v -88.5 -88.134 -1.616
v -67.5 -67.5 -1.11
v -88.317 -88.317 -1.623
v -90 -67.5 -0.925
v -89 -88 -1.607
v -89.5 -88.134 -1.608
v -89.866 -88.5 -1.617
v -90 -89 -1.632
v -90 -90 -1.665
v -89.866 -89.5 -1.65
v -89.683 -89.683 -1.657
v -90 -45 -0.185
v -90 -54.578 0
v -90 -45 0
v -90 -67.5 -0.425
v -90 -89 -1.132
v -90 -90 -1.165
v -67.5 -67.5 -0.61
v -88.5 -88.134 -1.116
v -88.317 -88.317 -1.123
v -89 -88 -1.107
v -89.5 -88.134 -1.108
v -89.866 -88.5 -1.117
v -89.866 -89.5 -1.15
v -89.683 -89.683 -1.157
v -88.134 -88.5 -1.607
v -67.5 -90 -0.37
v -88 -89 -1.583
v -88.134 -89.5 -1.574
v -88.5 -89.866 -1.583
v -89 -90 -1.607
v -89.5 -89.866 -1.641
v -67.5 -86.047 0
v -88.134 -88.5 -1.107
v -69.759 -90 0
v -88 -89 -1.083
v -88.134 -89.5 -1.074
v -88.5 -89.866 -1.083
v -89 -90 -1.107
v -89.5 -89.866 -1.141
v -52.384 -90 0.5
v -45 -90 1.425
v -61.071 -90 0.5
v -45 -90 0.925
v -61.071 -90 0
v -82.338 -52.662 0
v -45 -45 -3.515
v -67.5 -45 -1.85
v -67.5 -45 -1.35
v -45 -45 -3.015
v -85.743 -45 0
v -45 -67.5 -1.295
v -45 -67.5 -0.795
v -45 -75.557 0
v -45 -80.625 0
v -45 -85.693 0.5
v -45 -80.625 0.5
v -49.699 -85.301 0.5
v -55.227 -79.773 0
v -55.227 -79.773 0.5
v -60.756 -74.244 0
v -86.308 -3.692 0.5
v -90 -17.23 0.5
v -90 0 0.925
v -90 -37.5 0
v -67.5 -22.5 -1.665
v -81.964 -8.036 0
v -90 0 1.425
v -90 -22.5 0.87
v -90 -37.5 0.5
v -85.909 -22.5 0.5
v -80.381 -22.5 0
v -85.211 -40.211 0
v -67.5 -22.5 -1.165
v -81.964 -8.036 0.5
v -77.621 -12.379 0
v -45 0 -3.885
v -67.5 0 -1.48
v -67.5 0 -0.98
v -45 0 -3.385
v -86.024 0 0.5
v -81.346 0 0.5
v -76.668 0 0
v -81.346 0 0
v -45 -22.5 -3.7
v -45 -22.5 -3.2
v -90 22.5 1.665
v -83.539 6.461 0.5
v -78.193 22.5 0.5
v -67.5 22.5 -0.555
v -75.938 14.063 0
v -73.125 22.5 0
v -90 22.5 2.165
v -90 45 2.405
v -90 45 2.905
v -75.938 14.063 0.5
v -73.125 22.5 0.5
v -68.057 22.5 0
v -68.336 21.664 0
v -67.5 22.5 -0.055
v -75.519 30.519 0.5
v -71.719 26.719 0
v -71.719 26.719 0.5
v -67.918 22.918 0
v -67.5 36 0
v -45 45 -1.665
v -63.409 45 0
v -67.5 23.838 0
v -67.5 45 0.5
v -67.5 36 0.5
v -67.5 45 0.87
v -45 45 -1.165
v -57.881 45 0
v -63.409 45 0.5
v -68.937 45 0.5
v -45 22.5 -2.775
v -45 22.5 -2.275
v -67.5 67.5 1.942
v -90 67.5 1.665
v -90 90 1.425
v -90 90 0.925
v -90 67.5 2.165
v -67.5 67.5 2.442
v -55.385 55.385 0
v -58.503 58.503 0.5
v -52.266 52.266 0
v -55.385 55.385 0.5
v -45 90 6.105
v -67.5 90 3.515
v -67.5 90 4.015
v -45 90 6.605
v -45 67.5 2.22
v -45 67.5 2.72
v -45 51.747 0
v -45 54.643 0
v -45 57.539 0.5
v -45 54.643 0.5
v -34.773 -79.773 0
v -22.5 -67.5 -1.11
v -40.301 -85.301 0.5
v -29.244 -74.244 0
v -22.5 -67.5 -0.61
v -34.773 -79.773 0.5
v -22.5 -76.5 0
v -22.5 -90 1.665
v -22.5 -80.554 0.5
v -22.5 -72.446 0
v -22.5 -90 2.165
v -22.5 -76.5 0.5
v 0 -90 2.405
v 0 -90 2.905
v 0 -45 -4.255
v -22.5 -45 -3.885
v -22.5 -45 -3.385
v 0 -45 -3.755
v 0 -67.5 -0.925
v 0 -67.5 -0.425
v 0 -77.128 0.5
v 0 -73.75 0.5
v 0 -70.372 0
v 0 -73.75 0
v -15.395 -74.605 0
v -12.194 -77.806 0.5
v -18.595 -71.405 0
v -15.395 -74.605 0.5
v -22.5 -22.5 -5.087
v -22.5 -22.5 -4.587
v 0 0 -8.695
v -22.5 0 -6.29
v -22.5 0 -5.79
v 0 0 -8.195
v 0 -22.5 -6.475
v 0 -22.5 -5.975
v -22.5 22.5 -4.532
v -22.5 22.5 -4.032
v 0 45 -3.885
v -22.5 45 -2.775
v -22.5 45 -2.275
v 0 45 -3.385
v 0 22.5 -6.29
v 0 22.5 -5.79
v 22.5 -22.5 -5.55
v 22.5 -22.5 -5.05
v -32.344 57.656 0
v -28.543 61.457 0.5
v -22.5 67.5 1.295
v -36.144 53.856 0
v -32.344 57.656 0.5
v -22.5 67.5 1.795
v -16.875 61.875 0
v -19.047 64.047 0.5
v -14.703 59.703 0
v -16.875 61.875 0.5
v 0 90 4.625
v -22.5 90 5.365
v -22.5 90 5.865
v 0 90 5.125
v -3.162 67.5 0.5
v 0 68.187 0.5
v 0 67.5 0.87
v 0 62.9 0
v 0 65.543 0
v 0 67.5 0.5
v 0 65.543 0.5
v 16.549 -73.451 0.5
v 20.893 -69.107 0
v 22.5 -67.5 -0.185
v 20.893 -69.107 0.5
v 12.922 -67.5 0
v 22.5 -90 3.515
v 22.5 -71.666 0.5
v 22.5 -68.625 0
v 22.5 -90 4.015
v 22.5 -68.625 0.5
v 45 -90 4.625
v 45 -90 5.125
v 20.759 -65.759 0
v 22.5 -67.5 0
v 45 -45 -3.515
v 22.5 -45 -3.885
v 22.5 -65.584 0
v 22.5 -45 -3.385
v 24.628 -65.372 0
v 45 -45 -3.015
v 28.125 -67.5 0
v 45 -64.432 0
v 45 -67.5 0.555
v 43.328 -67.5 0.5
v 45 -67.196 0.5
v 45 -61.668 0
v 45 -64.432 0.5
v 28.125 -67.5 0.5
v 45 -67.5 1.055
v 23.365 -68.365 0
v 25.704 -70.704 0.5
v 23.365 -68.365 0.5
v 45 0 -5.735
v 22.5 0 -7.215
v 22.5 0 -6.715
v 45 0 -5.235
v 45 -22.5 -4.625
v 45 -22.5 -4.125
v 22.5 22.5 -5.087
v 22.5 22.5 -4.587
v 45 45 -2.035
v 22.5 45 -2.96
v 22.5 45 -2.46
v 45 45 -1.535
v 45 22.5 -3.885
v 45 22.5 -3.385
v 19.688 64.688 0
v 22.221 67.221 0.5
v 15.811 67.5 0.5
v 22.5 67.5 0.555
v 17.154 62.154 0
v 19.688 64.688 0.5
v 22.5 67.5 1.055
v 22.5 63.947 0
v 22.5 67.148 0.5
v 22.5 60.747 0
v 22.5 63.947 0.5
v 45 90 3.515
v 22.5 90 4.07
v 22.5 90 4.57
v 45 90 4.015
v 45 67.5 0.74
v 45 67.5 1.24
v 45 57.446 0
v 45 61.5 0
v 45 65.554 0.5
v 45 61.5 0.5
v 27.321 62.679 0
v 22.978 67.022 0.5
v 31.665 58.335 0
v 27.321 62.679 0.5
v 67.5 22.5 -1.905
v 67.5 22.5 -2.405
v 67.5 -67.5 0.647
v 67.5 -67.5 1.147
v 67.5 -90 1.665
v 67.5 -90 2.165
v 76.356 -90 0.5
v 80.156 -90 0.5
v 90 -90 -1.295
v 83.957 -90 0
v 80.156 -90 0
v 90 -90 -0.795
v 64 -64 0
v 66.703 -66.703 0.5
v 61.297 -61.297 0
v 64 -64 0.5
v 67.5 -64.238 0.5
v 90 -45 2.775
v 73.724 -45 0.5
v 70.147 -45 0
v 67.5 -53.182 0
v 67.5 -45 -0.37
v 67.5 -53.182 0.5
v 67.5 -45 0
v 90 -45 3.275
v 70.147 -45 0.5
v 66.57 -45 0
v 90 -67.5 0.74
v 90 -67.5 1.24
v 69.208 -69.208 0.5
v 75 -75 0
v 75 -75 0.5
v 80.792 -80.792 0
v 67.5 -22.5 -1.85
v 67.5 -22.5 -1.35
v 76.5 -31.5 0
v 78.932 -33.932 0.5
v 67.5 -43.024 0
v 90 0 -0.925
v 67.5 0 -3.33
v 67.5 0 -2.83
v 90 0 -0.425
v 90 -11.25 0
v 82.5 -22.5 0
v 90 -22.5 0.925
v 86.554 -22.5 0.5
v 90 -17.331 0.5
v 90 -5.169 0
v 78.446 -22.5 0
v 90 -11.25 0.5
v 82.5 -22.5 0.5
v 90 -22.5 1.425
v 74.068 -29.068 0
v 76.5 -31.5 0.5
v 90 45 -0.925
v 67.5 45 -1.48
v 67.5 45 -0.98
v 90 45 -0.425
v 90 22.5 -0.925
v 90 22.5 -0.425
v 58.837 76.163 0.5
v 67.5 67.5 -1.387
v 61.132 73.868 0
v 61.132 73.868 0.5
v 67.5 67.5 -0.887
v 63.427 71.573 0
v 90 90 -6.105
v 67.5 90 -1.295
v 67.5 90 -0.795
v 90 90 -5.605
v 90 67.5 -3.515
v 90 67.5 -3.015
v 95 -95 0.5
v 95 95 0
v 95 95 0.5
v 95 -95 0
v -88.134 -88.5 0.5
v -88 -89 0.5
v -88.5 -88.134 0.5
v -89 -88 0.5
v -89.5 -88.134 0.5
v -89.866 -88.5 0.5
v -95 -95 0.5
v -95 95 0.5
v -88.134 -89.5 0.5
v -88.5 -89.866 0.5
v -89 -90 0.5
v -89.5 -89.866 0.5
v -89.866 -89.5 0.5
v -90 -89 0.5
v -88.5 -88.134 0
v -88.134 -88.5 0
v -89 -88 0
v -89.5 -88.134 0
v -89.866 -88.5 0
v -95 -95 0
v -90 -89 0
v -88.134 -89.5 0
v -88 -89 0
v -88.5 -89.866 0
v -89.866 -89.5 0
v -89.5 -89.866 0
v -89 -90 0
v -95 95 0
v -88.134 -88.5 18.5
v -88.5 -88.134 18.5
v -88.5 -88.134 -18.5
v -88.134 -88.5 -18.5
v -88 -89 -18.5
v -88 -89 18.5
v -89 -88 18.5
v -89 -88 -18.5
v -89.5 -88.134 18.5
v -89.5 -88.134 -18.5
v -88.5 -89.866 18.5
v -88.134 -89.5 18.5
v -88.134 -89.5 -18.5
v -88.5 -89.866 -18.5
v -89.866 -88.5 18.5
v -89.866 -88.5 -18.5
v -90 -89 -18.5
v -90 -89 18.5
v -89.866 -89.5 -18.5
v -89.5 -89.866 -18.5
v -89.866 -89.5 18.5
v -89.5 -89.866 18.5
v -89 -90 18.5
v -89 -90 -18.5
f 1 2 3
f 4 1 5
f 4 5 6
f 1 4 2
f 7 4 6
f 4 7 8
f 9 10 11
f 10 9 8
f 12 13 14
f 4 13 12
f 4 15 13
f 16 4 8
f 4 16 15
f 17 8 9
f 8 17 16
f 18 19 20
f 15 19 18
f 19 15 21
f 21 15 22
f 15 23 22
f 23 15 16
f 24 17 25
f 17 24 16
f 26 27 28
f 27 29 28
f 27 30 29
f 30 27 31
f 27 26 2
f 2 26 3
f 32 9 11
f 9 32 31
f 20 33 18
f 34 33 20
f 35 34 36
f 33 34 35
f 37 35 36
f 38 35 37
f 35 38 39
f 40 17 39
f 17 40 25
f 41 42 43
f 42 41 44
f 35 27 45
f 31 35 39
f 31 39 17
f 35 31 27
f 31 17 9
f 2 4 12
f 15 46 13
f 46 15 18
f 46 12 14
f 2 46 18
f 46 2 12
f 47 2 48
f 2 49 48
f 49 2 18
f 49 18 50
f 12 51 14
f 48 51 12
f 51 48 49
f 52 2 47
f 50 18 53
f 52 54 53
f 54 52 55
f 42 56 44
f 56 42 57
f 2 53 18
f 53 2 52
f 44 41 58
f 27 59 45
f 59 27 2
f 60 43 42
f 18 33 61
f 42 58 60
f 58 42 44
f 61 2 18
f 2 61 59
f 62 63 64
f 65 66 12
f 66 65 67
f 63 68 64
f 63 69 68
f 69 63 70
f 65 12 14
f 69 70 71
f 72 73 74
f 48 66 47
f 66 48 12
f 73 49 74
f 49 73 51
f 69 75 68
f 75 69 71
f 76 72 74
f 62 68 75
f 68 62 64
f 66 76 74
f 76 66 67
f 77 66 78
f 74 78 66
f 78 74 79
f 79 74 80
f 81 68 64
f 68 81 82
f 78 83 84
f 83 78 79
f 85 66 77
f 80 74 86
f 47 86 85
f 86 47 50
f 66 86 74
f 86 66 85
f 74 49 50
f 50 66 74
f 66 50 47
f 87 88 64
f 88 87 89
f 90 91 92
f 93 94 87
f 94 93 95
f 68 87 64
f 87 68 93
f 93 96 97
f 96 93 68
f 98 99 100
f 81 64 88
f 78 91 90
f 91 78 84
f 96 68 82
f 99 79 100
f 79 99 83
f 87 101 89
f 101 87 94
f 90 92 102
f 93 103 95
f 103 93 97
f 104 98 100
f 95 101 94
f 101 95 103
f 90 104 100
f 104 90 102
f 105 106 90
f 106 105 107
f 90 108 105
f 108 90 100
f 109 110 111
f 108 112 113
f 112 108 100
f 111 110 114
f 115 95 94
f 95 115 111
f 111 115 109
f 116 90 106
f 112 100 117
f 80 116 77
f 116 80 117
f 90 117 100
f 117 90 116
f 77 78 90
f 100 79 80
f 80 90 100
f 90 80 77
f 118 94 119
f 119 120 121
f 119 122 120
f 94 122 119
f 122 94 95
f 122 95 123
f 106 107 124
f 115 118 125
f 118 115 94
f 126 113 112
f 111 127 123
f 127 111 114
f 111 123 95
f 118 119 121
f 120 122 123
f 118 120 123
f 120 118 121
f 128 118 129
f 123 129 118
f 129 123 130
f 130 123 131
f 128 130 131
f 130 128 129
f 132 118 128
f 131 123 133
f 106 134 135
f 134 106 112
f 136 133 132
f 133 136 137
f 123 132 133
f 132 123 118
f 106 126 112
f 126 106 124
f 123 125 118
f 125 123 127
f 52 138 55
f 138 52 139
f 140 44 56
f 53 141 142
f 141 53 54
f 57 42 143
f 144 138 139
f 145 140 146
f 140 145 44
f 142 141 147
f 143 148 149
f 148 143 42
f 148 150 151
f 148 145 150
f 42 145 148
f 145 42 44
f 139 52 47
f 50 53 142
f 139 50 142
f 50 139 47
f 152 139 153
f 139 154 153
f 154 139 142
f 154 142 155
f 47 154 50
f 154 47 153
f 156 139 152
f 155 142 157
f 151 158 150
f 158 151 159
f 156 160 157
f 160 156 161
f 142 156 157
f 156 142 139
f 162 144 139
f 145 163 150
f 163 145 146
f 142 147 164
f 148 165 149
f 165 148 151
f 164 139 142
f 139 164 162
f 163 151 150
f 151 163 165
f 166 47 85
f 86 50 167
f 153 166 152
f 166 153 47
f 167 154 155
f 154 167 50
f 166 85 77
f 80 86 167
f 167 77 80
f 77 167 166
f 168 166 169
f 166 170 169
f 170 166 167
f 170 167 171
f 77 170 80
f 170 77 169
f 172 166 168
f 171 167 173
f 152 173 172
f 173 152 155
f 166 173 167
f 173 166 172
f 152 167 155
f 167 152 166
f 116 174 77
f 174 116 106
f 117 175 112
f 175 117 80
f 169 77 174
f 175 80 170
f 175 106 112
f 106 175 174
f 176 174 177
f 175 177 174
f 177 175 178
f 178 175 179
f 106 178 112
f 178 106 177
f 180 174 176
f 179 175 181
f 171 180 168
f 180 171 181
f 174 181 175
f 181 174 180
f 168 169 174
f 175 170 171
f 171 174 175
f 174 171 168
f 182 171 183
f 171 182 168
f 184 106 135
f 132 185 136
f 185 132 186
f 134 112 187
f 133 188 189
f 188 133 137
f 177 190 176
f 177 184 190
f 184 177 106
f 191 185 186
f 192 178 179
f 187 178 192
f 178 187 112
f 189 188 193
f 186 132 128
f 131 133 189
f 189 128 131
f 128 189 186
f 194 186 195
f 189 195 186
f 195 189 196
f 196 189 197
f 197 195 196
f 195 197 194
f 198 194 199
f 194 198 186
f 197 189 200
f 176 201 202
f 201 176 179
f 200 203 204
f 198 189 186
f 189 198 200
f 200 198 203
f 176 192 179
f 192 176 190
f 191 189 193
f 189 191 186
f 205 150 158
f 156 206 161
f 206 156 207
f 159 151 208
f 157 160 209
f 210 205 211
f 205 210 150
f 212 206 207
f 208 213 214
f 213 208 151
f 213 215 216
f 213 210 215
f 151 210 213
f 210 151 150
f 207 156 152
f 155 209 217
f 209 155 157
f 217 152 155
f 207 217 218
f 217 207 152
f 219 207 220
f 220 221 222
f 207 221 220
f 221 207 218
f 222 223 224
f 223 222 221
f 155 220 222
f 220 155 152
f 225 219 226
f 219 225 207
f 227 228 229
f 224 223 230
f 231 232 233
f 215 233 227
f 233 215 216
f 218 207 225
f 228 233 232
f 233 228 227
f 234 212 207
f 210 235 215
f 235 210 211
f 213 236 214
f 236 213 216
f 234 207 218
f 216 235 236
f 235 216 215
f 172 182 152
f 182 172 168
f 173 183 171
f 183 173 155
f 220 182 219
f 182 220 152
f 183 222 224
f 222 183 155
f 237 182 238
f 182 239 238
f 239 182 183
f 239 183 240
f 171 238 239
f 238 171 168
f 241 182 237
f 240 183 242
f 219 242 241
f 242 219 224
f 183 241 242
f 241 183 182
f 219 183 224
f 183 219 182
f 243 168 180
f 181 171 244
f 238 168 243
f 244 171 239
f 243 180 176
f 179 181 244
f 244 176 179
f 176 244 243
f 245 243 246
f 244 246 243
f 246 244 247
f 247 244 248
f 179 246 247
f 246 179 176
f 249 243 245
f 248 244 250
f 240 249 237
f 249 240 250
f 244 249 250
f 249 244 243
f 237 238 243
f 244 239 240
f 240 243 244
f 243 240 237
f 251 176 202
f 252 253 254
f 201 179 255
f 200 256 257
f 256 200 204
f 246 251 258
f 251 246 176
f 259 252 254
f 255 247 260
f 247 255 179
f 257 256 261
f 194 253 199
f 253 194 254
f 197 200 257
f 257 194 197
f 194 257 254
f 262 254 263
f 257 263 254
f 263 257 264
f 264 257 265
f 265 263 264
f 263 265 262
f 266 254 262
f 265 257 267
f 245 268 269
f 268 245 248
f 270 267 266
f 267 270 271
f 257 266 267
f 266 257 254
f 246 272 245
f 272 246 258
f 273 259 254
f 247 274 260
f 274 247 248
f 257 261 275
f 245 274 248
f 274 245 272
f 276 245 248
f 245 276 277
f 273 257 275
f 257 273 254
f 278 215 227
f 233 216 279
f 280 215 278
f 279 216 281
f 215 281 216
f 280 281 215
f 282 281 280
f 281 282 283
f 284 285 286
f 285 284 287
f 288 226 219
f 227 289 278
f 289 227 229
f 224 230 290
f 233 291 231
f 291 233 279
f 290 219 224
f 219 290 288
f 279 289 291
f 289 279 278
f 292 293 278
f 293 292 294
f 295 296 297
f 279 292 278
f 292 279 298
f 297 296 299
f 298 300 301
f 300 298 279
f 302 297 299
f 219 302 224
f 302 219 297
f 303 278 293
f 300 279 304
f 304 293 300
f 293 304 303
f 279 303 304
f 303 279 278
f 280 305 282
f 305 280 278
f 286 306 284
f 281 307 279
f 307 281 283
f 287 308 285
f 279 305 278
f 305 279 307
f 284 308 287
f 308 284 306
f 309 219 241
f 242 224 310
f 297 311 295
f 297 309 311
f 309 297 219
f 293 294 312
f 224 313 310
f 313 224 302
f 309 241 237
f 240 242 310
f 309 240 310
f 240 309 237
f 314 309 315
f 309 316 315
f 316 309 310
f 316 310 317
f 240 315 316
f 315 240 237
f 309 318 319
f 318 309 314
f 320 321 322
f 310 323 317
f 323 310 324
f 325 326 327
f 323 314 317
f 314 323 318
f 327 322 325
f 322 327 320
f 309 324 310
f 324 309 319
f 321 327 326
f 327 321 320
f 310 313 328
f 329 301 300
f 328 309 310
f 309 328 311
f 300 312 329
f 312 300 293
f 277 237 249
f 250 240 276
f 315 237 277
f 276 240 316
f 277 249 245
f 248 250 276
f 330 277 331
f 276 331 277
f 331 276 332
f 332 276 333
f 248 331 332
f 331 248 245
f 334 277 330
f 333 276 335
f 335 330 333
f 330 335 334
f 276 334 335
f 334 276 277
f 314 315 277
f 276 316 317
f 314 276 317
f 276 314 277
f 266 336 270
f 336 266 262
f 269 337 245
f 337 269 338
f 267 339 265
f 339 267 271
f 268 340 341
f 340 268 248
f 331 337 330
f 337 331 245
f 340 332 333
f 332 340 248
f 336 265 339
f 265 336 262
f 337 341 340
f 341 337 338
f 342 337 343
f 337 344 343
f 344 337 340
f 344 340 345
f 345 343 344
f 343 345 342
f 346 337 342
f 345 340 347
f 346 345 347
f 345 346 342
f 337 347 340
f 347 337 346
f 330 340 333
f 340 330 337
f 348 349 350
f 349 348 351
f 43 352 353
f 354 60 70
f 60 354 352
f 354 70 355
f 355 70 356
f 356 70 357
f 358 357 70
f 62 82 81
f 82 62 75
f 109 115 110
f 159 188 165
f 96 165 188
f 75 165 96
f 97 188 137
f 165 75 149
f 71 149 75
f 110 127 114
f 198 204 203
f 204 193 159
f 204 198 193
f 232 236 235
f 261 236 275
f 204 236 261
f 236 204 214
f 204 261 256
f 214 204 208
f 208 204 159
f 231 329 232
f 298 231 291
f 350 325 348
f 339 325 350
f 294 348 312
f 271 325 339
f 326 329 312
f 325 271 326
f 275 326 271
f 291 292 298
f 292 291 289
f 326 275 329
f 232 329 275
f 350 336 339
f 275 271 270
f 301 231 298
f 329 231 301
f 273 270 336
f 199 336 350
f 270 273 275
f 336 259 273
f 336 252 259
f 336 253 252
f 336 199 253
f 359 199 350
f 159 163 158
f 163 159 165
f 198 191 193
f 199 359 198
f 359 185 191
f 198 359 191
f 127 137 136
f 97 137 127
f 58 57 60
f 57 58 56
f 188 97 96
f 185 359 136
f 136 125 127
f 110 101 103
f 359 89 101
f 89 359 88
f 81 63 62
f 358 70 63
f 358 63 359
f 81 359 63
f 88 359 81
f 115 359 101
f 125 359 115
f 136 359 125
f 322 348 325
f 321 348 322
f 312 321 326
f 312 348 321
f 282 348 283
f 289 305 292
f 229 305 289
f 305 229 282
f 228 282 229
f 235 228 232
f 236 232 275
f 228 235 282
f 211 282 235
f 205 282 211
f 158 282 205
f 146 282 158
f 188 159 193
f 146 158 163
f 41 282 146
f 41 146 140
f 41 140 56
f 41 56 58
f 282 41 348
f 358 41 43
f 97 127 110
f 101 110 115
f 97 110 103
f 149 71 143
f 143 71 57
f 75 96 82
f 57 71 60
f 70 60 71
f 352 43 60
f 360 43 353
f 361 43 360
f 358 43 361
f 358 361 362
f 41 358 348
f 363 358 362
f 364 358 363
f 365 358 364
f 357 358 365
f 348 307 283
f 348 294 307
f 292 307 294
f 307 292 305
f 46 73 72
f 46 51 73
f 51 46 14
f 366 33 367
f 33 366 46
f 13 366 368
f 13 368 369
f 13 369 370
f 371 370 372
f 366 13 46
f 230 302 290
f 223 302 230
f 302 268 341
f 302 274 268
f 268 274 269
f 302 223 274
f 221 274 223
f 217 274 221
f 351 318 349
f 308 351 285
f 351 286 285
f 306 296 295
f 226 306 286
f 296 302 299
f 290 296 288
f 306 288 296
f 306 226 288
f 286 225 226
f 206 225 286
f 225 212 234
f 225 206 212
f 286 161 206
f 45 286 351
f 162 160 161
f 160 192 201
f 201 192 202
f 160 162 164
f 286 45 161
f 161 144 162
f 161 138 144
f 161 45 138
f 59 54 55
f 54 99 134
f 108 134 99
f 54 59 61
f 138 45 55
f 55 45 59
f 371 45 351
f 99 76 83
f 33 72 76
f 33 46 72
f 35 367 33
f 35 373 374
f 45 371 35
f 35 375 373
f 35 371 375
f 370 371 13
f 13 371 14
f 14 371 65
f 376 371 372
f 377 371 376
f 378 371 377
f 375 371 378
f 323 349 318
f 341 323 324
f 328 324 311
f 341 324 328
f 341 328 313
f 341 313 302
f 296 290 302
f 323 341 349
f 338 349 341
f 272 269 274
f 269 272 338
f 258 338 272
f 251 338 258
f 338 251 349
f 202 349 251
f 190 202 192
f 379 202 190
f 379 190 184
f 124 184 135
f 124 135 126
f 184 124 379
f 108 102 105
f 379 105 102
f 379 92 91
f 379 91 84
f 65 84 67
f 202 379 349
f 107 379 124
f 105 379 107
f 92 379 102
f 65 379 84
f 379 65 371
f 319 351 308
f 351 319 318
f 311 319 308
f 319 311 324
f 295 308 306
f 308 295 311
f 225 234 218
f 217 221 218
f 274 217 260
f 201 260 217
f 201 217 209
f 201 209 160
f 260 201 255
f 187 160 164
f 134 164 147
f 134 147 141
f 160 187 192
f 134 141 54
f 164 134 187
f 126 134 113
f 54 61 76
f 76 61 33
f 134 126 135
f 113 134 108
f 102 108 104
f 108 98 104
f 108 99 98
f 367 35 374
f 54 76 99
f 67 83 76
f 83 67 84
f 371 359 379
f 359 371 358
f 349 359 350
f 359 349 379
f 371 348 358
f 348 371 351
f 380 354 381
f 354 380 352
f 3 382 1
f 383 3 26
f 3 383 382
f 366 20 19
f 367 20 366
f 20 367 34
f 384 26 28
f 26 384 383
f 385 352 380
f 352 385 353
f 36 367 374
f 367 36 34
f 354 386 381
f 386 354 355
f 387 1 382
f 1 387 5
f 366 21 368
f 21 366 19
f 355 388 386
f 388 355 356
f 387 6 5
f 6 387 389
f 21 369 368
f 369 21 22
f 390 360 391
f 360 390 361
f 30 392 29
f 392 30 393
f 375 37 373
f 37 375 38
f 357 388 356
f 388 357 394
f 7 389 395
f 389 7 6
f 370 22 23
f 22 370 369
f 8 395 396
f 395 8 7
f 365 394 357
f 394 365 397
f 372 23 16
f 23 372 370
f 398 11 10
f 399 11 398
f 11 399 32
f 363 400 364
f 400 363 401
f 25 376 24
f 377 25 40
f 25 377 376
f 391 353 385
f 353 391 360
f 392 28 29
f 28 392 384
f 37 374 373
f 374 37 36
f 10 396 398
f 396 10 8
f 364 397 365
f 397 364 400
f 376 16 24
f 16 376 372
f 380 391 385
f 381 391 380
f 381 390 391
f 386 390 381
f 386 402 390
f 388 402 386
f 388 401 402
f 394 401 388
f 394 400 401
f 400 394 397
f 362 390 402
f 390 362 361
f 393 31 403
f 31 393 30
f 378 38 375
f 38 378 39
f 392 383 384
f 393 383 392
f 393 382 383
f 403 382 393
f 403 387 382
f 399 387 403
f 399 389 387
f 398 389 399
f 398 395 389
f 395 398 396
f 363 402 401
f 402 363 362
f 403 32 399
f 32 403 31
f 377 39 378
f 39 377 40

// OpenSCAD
 /**************************************\
 *                                      *
 *   OpenSCAD Mesh Display              *
 *   by Thinkyhead - April 2017         *
 *                                      *
 *   Copy the grid output from Marlin,  *
 *   paste below as shown, and use      *
 *   OpenSCAD to see a visualization    *
 *   of your mesh.                      *
 *                                      *
 \**************************************/

$t = 0.15; // comment out during animation!
X = 0; Y = 1;
L = 0; R = 1; F = 2; B = 3;

//
// Sample Mesh - Replace with your own
//
measured_z = [
  [ -1.20, -1.13, -1.09, -1.03, -1.19 ],
  [ -1.16, -1.25, -1.27, -1.25, -1.08 ],
  [ -1.13, -1.26, -1.39, -1.31, -1.18 ],
  [ -1.09, -1.20, -1.26, -1.21, -1.18 ],
  [ -1.13, -0.99, -1.03, -1.06, -1.32 ]
];

//
// An offset to add to all points in the mesh
//
zadjust     = 0;

//
// Mesh characteristics
//
bed_size = [ 200, 200 ];

mesh_inset  = [ 10, 10, 10, 10 ]; // L, F, R, B

mesh_bounds = [
  [ mesh_inset[L], mesh_inset[F] ],
  [ bed_size[X] - mesh_inset[R], bed_size[Y] - mesh_inset[B] ]
];

mesh_size = mesh_bounds[1] - mesh_bounds[0];

                      /// NOTE: Marlin meshes already subtract the probe offset
NAN         = 0;      // Z to use for un-measured points

//
// Geometry
//

max_z_scale   = 100;   // Scale at Time 0.5
min_z_scale   = 10;    // Scale at Time 0.0 and 1.0
thickness     = 0.5;   // thickness of the mesh triangles
tesselation   = 1;     // levels of tesselation from 0-2
alternation   = 2;     // direction change modulus (try it)

//
// Appearance
//

show_plane    = true;
show_labels   = true;
show_coords   = true;
arrow_length  = 5;

label_font_lg = "Arial";
label_font_sm = "Arial";
mesh_color    = [1,1,1,0.5];
plane_color   = [0.4,0.6,0.9,0.6];

//================================================ Derive useful values

big_z = max_2D(measured_z,0);
lil_z = min_2D(measured_z,0);

mean_value = (big_z + lil_z) / 2.0;

mesh_points_y = len(measured_z);
mesh_points_x = len(measured_z[0]);

xspace = mesh_size[X] / (mesh_points_x - 1);
yspace = mesh_size[Y] / (mesh_points_y - 1);

// At $t=0 and $t=1 scale will be 100%
z_scale_factor = min_z_scale + (($t > 0.5) ? 1.0 - $t : $t) * (max_z_scale - min_z_scale) * 2;

//
// Min and max recursive functions for 1D and 2D arrays
// Return the smallest or largest value in the array
//
function some_1D(b,i) = (i<len(b)-1) ? (b[i] && some_1D(b,i+1)) : b[i] != 0;
function some_2D(a,j) = (j<len(a)-1) ? some_2D(a,j+1) : some_1D(a[j], 0);
function min_1D(b,i) = (i<len(b)-1) ? min(b[i], min_1D(b,i+1)) : b[i];
function min_2D(a,j) = (j<len(a)-1) ? min_2D(a,j+1) : min_1D(a[j], 0);
function max_1D(b,i) = (i<len(b)-1) ? max(b[i], max_1D(b,i+1)) : b[i];
function max_2D(a,j) = (j<len(a)-1) ? max_2D(a,j+1) : max_1D(a[j], 0);

//
// Get the corner probe points of a grid square.
//
// Input  : x,y grid indexes
// Output : An array of the 4 corner points
//
function grid_square(x,y) = [
  [x * xspace, y * yspace, z_scale_factor * (measured_z[y][x] - mean_value)],
  [x * xspace, (y+1) * yspace, z_scale_factor * (measured_z[y+1][x] - mean_value)],
  [(x+1) * xspace, (y+1) * yspace, z_scale_factor * (measured_z[y+1][x+1] - mean_value)],
  [(x+1) * xspace, y * yspace, z_scale_factor * (measured_z[y][x+1] - mean_value)]
];

// The corner point of a grid square with Z centered on the mean
function pos(x,y,z) = [x * xspace, y * yspace, z_scale_factor * (z - mean_value)];

//
// Draw the point markers and labels
//
module point_markers(show_home=true) {
  // Mark the home position 0,0
  if (show_home)
    translate([1,1]) color([0,0,0,0.25])
      cylinder(r=1, h=z_scale_factor, center=true);

  for (x=[0:mesh_points_x-1], y=[0:mesh_points_y-1]) {
    z = measured_z[y][x] - zadjust;
    down = z < mean_value;
    xyz = pos(x, y, z);
    translate([ xyz[0], xyz[1] ]) {

      // Show the XY as well as the Z!
      if (show_coords) {
        color("black")
        translate([0,0,0.5]) {
          $fn=8;
          rotate([0,0]) {
            posx = floor(mesh_bounds[0][X] + x * xspace);
            posy = floor(mesh_bounds[0][Y] + y * yspace);
            text(str(posx, ",", posy), 2, label_font_sm, halign="center", valign="center");
          }
        }
      }

      translate([ 0, 0, xyz[2] ]) {
        // Label each point with the Z
        v = z - mean_value;
        if (show_labels) {

          color(abs(v) < 0.1 ? [0,0.5,0] : [0.25,0,0])
          translate([0,0,down?-10:10]) {

            $fn=8;
            rotate([90,0])
              text(str(z), 6, label_font_lg, halign="center", valign="center");

            if (v)
              translate([0,0,down?-6:6]) rotate([90,0])
                text(str(down || !v ? "" : "+", v), 3, label_font_sm, halign="center", valign="center");
          }
        }

        // Show an arrow pointing up or down
        if (v) {
          rotate([0, down ? 180 : 0]) translate([0,0,-1])
            cylinder(
              r1=0.5,
              r2=0.1,
              h=arrow_length, $fn=12, center=1
            );
        }
        else
          color([1,0,1,0.4]) sphere(r=1.0, $fn=20, center=1);
      }
    }
  }
}

//
// Split a square on the diagonal into
// two triangles and render them.
//
//     s : a square
//   alt : a flag to split on the other diagonal
//
module tesselated_square(s, alt=false) {
  add = [0,0,thickness];
  p1 = [
    s[0], s[1], s[2], s[3],
    s[0]+add, s[1]+add, s[2]+add, s[3]+add
  ];
  f1 = alt
      ? [ [0,1,3], [4,5,1,0], [4,7,5], [5,7,3,1], [7,4,0,3] ]
      : [ [0,1,2], [4,5,1,0], [4,6,5], [5,6,2,1], [6,4,0,2] ];
  f2 = alt
      ? [ [1,2,3], [5,6,2,1], [5,6,7], [6,7,3,2], [7,5,1,3] ]
      : [ [0,2,3], [4,6,2,0], [4,7,6], [6,7,3,2], [7,4,0,3] ];

  // Use the other diagonal
  polyhedron(points=p1, faces=f1);
  polyhedron(points=p1, faces=f2);
}

/**
 * The simplest mesh display
 */
module simple_mesh(show_plane=show_plane) {
  if (show_plane) color(plane_color) cube([mesh_size[X], mesh_size[Y], thickness]);
  color(mesh_color)
    for (x=[0:mesh_points_x-2], y=[0:mesh_points_y-2])
      tesselated_square(grid_square(x, y));
}

/**
 * Subdivide the mesh into smaller squares.
 */
module bilinear_mesh(show_plane=show_plane,tesselation=tesselation) {
  if (show_plane) color(plane_color) translate([-5,-5]) cube([mesh_size[X]+10, mesh_size[Y]+10, thickness]);

  if (some_2D(measured_z, 0)) {

    tesselation = tesselation % 4;
    color(mesh_color)
    for (x=[0:mesh_points_x-2], y=[0:mesh_points_y-2]) {
      square = grid_square(x, y);
      if (tesselation < 1) {
        tesselated_square(square,(x%alternation)-(y%alternation));
      }
      else {
        subdiv_4 = subdivided_square(square);
        if (tesselation < 2) {
          for (i=[0:3]) tesselated_square(subdiv_4[i],i%alternation);
        }
        else {
          for (i=[0:3]) {
            subdiv_16 = subdivided_square(subdiv_4[i]);
            if (tesselation < 3) {
              for (j=[0:3]) tesselated_square(subdiv_16[j],j%alternation);
            }
            else {
              for (j=[0:3]) {
                subdiv_64 = subdivided_square(subdiv_16[j]);
                if (tesselation < 4) {
                  for (k=[0:3]) tesselated_square(subdiv_64[k]);
                }
              }
            }
          }
        }
      }
    }

  }
}

//
// Subdivision helpers
//
function ctrz(a) = (a[0][2]+a[1][2]+a[3][2]+a[2][2])/4;
function avgx(a,i) = (a[i][0]+a[(i+1)%4][0])/2;
function avgy(a,i) = (a[i][1]+a[(i+1)%4][1])/2;
function avgz(a,i) = (a[i][2]+a[(i+1)%4][2])/2;

//
// Convert one square into 4, applying bilinear averaging
//
// Input  : 1 square (4 points)
// Output : An array of 4 squares
//
function subdivided_square(a) = [
  [ // SW square
    a[0],                          // SW
    [a[0][0],avgy(a,0),avgz(a,0)], // CW
    [avgx(a,1),avgy(a,0),ctrz(a)], // CC
    [avgx(a,1),a[0][1],avgz(a,3)]  // SC
  ],
  [ // NW square
    [a[0][0],avgy(a,0),avgz(a,0)], // CW
    a[1],                          // NW
    [avgx(a,1),a[1][1],avgz(a,1)], // NC
    [avgx(a,1),avgy(a,0),ctrz(a)]  // CC
  ],
  [ // NE square
    [avgx(a,1),avgy(a,0),ctrz(a)], // CC
    [avgx(a,1),a[1][1],avgz(a,1)], // NC
    a[2],                          // NE
    [a[2][0],avgy(a,0),avgz(a,2)]  // CE
  ],
  [ // SE square
    [avgx(a,1),a[0][1],avgz(a,3)], // SC
    [avgx(a,1),avgy(a,0),ctrz(a)], // CC
    [a[2][0],avgy(a,0),avgz(a,2)], // CE
    a[3]                           // SE
  ]
];


//================================================ Run the plan

translate([-mesh_size[X] / 2, -mesh_size[Y] / 2]) {
  $fn = 12;
  point_markers();
  bilinear_mesh();
}
